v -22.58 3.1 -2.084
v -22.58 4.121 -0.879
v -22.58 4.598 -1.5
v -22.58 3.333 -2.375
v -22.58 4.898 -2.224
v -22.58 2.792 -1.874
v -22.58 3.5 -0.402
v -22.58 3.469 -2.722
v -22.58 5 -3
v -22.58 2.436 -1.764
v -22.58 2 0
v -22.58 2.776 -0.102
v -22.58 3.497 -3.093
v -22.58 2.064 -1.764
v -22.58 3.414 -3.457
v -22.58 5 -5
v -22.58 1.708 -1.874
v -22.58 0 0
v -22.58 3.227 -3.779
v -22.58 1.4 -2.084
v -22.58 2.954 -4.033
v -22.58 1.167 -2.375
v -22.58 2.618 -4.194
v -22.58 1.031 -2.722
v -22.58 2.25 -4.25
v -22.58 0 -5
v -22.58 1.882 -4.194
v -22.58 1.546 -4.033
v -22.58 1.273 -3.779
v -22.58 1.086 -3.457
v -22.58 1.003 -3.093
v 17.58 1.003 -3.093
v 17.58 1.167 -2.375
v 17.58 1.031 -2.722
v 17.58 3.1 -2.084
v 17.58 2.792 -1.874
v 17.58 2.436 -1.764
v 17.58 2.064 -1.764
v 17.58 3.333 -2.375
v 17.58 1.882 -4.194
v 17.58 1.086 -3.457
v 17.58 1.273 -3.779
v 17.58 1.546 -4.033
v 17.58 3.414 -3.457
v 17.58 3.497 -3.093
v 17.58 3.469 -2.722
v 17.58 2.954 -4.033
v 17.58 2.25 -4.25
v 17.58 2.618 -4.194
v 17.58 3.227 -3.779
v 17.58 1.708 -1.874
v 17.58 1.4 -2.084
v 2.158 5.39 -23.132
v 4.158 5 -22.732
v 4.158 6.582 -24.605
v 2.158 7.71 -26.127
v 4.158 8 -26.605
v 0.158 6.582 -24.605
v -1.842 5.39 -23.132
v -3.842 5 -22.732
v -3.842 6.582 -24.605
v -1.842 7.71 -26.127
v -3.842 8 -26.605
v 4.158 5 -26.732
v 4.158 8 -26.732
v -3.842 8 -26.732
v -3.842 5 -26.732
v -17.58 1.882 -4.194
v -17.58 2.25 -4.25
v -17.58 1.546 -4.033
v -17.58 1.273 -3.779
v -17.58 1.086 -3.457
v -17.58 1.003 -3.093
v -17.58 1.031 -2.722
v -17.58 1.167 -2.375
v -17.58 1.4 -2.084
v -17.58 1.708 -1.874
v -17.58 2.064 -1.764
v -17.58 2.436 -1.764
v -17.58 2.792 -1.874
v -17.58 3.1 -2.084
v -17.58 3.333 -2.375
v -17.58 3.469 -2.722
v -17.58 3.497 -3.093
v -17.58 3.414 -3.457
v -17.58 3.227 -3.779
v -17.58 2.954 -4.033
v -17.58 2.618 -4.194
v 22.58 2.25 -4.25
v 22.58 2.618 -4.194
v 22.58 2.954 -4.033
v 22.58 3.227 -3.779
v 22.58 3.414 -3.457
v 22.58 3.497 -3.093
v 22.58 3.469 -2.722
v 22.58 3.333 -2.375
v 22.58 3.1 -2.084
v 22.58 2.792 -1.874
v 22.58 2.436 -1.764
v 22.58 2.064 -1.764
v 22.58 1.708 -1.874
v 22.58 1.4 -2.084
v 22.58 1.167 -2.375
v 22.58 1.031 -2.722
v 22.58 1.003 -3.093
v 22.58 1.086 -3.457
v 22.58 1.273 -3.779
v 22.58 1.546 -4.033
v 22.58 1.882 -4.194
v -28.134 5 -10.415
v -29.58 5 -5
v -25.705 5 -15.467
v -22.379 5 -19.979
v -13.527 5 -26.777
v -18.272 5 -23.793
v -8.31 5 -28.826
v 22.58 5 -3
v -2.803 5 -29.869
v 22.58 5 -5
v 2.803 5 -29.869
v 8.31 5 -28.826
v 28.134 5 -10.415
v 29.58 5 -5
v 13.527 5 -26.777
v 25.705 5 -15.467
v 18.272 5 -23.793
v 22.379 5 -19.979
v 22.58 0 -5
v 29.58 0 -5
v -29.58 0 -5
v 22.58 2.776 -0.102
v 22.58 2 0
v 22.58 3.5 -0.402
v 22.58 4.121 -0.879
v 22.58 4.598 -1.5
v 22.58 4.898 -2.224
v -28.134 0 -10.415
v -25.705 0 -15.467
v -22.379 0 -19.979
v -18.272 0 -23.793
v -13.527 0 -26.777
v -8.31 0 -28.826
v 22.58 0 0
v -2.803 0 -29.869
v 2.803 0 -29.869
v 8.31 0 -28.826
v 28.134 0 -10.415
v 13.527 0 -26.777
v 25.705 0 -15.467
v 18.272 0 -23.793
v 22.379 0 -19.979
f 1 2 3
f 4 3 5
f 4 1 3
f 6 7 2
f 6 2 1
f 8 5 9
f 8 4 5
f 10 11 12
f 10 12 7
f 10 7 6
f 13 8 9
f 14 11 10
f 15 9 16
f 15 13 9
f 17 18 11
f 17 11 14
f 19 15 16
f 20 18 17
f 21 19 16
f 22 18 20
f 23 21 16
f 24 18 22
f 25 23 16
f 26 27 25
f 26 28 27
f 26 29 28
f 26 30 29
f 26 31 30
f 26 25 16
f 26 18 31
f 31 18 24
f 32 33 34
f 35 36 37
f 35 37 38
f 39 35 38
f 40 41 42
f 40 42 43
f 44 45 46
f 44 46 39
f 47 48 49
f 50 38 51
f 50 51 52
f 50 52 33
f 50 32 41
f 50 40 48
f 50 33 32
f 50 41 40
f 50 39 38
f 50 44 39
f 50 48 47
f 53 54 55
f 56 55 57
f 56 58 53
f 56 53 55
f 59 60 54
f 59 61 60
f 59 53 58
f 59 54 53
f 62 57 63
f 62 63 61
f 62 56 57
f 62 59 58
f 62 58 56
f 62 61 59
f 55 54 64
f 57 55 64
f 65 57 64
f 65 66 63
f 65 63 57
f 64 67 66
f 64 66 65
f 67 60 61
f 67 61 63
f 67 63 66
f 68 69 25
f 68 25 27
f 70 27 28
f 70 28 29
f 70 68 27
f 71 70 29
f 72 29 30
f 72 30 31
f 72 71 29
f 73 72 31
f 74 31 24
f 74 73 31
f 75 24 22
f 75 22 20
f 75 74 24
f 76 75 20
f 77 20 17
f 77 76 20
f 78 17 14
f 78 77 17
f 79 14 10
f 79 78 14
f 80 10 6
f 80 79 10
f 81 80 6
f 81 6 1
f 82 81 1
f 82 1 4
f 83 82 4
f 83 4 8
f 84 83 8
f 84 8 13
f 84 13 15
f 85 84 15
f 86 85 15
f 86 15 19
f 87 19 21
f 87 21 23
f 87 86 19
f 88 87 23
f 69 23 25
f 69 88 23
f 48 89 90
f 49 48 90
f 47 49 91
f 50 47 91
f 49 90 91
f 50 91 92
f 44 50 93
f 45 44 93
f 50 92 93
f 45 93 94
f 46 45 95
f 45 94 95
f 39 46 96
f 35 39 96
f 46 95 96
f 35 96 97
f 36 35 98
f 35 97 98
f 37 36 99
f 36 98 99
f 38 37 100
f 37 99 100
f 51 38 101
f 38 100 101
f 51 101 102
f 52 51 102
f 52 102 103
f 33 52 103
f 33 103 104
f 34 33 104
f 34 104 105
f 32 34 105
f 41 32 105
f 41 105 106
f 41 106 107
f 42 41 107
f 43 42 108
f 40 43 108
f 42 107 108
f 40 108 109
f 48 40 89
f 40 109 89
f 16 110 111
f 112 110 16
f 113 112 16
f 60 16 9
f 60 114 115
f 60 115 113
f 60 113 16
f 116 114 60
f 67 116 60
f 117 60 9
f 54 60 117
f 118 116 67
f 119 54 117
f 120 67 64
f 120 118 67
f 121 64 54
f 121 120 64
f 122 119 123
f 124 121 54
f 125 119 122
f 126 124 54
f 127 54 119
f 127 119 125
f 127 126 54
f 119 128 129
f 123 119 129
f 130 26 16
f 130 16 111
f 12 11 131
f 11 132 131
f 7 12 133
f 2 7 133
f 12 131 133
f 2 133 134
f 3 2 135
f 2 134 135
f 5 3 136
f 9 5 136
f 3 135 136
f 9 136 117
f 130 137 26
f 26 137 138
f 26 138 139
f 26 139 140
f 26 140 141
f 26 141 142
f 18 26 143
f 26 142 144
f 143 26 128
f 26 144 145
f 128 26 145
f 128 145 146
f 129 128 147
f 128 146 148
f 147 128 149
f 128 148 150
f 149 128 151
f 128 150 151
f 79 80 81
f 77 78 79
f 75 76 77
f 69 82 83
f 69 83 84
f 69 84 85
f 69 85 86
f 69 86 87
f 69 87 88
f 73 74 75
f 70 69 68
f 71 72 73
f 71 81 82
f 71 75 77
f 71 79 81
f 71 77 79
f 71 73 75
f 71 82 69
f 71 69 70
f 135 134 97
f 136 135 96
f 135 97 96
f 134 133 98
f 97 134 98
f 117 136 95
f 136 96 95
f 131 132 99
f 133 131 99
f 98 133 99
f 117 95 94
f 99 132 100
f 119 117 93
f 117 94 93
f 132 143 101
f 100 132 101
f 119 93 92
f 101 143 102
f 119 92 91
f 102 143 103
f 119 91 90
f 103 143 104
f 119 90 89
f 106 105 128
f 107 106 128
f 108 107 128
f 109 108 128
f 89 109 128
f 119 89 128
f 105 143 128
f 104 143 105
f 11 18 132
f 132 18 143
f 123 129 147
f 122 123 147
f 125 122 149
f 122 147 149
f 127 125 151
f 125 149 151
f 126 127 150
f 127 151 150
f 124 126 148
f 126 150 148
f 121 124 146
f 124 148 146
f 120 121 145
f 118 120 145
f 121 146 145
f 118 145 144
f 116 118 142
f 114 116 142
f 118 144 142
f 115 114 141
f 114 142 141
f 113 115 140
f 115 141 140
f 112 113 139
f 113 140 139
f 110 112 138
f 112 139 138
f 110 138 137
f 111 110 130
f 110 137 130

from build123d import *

# Parameters (mm, degrees)
BOSS_EXTRUDE1_DEPTH = 5
SKETCH3_W           = 8
SKETCH3_H           = 4
BOSS_EXTRUDE2_DEPTH = 3
FILLET1_START       = -3.841593316
FILLET1_DEPTH       = 8
CUT_EXTRUDE1_START  = -10
CUT_EXTRUDE1_DEPTH  = 10
FILLET2_R           = 3
SKETCH6_R           = 1.25
CUT_EXTRUDE2_DEPTH  = 5
CUT_EXTRUDE3_START  = -5
SKETCH7_R           = 1.25
CUT_EXTRUDE3_DEPTH  = 5


with BuildPart() as part:
    # Sketch1 → Boss-Extrude1 (new body)
    with BuildSketch(Plane(origin=(0, 0, 0), x_dir=(1, 0, 0), z_dir=(0, 1, 0))):
        with BuildLine():
            Line((-30, 0), (30, 0))
            ThreePointArc((30, 0), (0, 30), (-30, 0))
        make_face()
    extrude(amount=BOSS_EXTRUDE1_DEPTH)

    # Sketch3 → Boss-Extrude2 (add)
    with BuildSketch(Plane(origin=(0, 5, 0), x_dir=(1, 0, 0), z_dir=(0, 1, 0))):
        with Locations((0.158406684, 24.731666579)):
            Rectangle(SKETCH3_W, SKETCH3_H)
    extrude(amount=BOSS_EXTRUDE2_DEPTH)

    # Fillet1: read off the stored shape, not the designer's step
    # Fillet1 outline → Fillet1 (cut)
    with BuildSketch(Plane.YZ.offset(FILLET1_START)):
        with BuildLine():
            Line((8, -22.731666579), (5, -22.731666579))
            add(Edge.make_bspline(
                [(5, -22.731666579), (8, -23.506263249), (8, -26.604649926)],
                knots=[0, 0, 0, 1, 1, 1], degree=2, weights=[1, 0.057495957, 1]))
            Line((8, -26.604649926), (8, -22.731666579))
        make_face()
    extrude(amount=FILLET1_DEPTH, mode=Mode.SUBTRACT)

    # Sketch5 → Cut-Extrude1 (cut)
    with BuildSketch(Plane(origin=(0, 5, 0), x_dir=(1, 0, 0), z_dir=(0, 1, 0)).offset(CUT_EXTRUDE1_START)):
        with BuildLine():
            Line((-22.580398915, 0), (-22.580398915, 5))
            Line((-22.580398915, 5), (-29.580398915, 5))
            ThreePointArc((-29.580398915, 5), (-29.894915684, 2.508787808), (-30, 0))
            Line((-30, 0), (-22.580398915, 0))
        make_face()
        with BuildLine():
            Line((22.580398915, 5), (29.580398915, 5))
            ThreePointArc((29.580398915, 5), (29.894915684, 2.508787808), (30, 0))
            Line((30, 0), (22.580398915, 0))
            Line((22.580398915, 0), (22.580398915, 5))
        make_face()
    extrude(amount=CUT_EXTRUDE1_DEPTH, mode=Mode.SUBTRACT)

    # Fillet2
    fillet2_edges = [part.edges().sort_by_distance(p)[0] for p in [
        (0, 5, 0),
    ]]
    fillet(fillet2_edges, radius=FILLET2_R)

    # Sketch6 → Cut-Extrude2 (cut)
    with BuildSketch(Plane(origin=(22.580398915, 0, 0), x_dir=(0, 0, -1), z_dir=(1, 0, 0))):
        with Locations((3, 2.25)):
            Circle(SKETCH6_R)
    extrude(amount=-CUT_EXTRUDE2_DEPTH, mode=Mode.SUBTRACT)

    # Sketch7 → Cut-Extrude3 (cut)
    with BuildSketch(Plane.ZY.offset(22.580398915).offset(CUT_EXTRUDE3_START)):
        with Locations(Location((-3, 2.25, 0), (0, 0, 180))):
            Circle(SKETCH7_R)
    extrude(amount=CUT_EXTRUDE3_DEPTH, mode=Mode.SUBTRACT)


solid = part.part
